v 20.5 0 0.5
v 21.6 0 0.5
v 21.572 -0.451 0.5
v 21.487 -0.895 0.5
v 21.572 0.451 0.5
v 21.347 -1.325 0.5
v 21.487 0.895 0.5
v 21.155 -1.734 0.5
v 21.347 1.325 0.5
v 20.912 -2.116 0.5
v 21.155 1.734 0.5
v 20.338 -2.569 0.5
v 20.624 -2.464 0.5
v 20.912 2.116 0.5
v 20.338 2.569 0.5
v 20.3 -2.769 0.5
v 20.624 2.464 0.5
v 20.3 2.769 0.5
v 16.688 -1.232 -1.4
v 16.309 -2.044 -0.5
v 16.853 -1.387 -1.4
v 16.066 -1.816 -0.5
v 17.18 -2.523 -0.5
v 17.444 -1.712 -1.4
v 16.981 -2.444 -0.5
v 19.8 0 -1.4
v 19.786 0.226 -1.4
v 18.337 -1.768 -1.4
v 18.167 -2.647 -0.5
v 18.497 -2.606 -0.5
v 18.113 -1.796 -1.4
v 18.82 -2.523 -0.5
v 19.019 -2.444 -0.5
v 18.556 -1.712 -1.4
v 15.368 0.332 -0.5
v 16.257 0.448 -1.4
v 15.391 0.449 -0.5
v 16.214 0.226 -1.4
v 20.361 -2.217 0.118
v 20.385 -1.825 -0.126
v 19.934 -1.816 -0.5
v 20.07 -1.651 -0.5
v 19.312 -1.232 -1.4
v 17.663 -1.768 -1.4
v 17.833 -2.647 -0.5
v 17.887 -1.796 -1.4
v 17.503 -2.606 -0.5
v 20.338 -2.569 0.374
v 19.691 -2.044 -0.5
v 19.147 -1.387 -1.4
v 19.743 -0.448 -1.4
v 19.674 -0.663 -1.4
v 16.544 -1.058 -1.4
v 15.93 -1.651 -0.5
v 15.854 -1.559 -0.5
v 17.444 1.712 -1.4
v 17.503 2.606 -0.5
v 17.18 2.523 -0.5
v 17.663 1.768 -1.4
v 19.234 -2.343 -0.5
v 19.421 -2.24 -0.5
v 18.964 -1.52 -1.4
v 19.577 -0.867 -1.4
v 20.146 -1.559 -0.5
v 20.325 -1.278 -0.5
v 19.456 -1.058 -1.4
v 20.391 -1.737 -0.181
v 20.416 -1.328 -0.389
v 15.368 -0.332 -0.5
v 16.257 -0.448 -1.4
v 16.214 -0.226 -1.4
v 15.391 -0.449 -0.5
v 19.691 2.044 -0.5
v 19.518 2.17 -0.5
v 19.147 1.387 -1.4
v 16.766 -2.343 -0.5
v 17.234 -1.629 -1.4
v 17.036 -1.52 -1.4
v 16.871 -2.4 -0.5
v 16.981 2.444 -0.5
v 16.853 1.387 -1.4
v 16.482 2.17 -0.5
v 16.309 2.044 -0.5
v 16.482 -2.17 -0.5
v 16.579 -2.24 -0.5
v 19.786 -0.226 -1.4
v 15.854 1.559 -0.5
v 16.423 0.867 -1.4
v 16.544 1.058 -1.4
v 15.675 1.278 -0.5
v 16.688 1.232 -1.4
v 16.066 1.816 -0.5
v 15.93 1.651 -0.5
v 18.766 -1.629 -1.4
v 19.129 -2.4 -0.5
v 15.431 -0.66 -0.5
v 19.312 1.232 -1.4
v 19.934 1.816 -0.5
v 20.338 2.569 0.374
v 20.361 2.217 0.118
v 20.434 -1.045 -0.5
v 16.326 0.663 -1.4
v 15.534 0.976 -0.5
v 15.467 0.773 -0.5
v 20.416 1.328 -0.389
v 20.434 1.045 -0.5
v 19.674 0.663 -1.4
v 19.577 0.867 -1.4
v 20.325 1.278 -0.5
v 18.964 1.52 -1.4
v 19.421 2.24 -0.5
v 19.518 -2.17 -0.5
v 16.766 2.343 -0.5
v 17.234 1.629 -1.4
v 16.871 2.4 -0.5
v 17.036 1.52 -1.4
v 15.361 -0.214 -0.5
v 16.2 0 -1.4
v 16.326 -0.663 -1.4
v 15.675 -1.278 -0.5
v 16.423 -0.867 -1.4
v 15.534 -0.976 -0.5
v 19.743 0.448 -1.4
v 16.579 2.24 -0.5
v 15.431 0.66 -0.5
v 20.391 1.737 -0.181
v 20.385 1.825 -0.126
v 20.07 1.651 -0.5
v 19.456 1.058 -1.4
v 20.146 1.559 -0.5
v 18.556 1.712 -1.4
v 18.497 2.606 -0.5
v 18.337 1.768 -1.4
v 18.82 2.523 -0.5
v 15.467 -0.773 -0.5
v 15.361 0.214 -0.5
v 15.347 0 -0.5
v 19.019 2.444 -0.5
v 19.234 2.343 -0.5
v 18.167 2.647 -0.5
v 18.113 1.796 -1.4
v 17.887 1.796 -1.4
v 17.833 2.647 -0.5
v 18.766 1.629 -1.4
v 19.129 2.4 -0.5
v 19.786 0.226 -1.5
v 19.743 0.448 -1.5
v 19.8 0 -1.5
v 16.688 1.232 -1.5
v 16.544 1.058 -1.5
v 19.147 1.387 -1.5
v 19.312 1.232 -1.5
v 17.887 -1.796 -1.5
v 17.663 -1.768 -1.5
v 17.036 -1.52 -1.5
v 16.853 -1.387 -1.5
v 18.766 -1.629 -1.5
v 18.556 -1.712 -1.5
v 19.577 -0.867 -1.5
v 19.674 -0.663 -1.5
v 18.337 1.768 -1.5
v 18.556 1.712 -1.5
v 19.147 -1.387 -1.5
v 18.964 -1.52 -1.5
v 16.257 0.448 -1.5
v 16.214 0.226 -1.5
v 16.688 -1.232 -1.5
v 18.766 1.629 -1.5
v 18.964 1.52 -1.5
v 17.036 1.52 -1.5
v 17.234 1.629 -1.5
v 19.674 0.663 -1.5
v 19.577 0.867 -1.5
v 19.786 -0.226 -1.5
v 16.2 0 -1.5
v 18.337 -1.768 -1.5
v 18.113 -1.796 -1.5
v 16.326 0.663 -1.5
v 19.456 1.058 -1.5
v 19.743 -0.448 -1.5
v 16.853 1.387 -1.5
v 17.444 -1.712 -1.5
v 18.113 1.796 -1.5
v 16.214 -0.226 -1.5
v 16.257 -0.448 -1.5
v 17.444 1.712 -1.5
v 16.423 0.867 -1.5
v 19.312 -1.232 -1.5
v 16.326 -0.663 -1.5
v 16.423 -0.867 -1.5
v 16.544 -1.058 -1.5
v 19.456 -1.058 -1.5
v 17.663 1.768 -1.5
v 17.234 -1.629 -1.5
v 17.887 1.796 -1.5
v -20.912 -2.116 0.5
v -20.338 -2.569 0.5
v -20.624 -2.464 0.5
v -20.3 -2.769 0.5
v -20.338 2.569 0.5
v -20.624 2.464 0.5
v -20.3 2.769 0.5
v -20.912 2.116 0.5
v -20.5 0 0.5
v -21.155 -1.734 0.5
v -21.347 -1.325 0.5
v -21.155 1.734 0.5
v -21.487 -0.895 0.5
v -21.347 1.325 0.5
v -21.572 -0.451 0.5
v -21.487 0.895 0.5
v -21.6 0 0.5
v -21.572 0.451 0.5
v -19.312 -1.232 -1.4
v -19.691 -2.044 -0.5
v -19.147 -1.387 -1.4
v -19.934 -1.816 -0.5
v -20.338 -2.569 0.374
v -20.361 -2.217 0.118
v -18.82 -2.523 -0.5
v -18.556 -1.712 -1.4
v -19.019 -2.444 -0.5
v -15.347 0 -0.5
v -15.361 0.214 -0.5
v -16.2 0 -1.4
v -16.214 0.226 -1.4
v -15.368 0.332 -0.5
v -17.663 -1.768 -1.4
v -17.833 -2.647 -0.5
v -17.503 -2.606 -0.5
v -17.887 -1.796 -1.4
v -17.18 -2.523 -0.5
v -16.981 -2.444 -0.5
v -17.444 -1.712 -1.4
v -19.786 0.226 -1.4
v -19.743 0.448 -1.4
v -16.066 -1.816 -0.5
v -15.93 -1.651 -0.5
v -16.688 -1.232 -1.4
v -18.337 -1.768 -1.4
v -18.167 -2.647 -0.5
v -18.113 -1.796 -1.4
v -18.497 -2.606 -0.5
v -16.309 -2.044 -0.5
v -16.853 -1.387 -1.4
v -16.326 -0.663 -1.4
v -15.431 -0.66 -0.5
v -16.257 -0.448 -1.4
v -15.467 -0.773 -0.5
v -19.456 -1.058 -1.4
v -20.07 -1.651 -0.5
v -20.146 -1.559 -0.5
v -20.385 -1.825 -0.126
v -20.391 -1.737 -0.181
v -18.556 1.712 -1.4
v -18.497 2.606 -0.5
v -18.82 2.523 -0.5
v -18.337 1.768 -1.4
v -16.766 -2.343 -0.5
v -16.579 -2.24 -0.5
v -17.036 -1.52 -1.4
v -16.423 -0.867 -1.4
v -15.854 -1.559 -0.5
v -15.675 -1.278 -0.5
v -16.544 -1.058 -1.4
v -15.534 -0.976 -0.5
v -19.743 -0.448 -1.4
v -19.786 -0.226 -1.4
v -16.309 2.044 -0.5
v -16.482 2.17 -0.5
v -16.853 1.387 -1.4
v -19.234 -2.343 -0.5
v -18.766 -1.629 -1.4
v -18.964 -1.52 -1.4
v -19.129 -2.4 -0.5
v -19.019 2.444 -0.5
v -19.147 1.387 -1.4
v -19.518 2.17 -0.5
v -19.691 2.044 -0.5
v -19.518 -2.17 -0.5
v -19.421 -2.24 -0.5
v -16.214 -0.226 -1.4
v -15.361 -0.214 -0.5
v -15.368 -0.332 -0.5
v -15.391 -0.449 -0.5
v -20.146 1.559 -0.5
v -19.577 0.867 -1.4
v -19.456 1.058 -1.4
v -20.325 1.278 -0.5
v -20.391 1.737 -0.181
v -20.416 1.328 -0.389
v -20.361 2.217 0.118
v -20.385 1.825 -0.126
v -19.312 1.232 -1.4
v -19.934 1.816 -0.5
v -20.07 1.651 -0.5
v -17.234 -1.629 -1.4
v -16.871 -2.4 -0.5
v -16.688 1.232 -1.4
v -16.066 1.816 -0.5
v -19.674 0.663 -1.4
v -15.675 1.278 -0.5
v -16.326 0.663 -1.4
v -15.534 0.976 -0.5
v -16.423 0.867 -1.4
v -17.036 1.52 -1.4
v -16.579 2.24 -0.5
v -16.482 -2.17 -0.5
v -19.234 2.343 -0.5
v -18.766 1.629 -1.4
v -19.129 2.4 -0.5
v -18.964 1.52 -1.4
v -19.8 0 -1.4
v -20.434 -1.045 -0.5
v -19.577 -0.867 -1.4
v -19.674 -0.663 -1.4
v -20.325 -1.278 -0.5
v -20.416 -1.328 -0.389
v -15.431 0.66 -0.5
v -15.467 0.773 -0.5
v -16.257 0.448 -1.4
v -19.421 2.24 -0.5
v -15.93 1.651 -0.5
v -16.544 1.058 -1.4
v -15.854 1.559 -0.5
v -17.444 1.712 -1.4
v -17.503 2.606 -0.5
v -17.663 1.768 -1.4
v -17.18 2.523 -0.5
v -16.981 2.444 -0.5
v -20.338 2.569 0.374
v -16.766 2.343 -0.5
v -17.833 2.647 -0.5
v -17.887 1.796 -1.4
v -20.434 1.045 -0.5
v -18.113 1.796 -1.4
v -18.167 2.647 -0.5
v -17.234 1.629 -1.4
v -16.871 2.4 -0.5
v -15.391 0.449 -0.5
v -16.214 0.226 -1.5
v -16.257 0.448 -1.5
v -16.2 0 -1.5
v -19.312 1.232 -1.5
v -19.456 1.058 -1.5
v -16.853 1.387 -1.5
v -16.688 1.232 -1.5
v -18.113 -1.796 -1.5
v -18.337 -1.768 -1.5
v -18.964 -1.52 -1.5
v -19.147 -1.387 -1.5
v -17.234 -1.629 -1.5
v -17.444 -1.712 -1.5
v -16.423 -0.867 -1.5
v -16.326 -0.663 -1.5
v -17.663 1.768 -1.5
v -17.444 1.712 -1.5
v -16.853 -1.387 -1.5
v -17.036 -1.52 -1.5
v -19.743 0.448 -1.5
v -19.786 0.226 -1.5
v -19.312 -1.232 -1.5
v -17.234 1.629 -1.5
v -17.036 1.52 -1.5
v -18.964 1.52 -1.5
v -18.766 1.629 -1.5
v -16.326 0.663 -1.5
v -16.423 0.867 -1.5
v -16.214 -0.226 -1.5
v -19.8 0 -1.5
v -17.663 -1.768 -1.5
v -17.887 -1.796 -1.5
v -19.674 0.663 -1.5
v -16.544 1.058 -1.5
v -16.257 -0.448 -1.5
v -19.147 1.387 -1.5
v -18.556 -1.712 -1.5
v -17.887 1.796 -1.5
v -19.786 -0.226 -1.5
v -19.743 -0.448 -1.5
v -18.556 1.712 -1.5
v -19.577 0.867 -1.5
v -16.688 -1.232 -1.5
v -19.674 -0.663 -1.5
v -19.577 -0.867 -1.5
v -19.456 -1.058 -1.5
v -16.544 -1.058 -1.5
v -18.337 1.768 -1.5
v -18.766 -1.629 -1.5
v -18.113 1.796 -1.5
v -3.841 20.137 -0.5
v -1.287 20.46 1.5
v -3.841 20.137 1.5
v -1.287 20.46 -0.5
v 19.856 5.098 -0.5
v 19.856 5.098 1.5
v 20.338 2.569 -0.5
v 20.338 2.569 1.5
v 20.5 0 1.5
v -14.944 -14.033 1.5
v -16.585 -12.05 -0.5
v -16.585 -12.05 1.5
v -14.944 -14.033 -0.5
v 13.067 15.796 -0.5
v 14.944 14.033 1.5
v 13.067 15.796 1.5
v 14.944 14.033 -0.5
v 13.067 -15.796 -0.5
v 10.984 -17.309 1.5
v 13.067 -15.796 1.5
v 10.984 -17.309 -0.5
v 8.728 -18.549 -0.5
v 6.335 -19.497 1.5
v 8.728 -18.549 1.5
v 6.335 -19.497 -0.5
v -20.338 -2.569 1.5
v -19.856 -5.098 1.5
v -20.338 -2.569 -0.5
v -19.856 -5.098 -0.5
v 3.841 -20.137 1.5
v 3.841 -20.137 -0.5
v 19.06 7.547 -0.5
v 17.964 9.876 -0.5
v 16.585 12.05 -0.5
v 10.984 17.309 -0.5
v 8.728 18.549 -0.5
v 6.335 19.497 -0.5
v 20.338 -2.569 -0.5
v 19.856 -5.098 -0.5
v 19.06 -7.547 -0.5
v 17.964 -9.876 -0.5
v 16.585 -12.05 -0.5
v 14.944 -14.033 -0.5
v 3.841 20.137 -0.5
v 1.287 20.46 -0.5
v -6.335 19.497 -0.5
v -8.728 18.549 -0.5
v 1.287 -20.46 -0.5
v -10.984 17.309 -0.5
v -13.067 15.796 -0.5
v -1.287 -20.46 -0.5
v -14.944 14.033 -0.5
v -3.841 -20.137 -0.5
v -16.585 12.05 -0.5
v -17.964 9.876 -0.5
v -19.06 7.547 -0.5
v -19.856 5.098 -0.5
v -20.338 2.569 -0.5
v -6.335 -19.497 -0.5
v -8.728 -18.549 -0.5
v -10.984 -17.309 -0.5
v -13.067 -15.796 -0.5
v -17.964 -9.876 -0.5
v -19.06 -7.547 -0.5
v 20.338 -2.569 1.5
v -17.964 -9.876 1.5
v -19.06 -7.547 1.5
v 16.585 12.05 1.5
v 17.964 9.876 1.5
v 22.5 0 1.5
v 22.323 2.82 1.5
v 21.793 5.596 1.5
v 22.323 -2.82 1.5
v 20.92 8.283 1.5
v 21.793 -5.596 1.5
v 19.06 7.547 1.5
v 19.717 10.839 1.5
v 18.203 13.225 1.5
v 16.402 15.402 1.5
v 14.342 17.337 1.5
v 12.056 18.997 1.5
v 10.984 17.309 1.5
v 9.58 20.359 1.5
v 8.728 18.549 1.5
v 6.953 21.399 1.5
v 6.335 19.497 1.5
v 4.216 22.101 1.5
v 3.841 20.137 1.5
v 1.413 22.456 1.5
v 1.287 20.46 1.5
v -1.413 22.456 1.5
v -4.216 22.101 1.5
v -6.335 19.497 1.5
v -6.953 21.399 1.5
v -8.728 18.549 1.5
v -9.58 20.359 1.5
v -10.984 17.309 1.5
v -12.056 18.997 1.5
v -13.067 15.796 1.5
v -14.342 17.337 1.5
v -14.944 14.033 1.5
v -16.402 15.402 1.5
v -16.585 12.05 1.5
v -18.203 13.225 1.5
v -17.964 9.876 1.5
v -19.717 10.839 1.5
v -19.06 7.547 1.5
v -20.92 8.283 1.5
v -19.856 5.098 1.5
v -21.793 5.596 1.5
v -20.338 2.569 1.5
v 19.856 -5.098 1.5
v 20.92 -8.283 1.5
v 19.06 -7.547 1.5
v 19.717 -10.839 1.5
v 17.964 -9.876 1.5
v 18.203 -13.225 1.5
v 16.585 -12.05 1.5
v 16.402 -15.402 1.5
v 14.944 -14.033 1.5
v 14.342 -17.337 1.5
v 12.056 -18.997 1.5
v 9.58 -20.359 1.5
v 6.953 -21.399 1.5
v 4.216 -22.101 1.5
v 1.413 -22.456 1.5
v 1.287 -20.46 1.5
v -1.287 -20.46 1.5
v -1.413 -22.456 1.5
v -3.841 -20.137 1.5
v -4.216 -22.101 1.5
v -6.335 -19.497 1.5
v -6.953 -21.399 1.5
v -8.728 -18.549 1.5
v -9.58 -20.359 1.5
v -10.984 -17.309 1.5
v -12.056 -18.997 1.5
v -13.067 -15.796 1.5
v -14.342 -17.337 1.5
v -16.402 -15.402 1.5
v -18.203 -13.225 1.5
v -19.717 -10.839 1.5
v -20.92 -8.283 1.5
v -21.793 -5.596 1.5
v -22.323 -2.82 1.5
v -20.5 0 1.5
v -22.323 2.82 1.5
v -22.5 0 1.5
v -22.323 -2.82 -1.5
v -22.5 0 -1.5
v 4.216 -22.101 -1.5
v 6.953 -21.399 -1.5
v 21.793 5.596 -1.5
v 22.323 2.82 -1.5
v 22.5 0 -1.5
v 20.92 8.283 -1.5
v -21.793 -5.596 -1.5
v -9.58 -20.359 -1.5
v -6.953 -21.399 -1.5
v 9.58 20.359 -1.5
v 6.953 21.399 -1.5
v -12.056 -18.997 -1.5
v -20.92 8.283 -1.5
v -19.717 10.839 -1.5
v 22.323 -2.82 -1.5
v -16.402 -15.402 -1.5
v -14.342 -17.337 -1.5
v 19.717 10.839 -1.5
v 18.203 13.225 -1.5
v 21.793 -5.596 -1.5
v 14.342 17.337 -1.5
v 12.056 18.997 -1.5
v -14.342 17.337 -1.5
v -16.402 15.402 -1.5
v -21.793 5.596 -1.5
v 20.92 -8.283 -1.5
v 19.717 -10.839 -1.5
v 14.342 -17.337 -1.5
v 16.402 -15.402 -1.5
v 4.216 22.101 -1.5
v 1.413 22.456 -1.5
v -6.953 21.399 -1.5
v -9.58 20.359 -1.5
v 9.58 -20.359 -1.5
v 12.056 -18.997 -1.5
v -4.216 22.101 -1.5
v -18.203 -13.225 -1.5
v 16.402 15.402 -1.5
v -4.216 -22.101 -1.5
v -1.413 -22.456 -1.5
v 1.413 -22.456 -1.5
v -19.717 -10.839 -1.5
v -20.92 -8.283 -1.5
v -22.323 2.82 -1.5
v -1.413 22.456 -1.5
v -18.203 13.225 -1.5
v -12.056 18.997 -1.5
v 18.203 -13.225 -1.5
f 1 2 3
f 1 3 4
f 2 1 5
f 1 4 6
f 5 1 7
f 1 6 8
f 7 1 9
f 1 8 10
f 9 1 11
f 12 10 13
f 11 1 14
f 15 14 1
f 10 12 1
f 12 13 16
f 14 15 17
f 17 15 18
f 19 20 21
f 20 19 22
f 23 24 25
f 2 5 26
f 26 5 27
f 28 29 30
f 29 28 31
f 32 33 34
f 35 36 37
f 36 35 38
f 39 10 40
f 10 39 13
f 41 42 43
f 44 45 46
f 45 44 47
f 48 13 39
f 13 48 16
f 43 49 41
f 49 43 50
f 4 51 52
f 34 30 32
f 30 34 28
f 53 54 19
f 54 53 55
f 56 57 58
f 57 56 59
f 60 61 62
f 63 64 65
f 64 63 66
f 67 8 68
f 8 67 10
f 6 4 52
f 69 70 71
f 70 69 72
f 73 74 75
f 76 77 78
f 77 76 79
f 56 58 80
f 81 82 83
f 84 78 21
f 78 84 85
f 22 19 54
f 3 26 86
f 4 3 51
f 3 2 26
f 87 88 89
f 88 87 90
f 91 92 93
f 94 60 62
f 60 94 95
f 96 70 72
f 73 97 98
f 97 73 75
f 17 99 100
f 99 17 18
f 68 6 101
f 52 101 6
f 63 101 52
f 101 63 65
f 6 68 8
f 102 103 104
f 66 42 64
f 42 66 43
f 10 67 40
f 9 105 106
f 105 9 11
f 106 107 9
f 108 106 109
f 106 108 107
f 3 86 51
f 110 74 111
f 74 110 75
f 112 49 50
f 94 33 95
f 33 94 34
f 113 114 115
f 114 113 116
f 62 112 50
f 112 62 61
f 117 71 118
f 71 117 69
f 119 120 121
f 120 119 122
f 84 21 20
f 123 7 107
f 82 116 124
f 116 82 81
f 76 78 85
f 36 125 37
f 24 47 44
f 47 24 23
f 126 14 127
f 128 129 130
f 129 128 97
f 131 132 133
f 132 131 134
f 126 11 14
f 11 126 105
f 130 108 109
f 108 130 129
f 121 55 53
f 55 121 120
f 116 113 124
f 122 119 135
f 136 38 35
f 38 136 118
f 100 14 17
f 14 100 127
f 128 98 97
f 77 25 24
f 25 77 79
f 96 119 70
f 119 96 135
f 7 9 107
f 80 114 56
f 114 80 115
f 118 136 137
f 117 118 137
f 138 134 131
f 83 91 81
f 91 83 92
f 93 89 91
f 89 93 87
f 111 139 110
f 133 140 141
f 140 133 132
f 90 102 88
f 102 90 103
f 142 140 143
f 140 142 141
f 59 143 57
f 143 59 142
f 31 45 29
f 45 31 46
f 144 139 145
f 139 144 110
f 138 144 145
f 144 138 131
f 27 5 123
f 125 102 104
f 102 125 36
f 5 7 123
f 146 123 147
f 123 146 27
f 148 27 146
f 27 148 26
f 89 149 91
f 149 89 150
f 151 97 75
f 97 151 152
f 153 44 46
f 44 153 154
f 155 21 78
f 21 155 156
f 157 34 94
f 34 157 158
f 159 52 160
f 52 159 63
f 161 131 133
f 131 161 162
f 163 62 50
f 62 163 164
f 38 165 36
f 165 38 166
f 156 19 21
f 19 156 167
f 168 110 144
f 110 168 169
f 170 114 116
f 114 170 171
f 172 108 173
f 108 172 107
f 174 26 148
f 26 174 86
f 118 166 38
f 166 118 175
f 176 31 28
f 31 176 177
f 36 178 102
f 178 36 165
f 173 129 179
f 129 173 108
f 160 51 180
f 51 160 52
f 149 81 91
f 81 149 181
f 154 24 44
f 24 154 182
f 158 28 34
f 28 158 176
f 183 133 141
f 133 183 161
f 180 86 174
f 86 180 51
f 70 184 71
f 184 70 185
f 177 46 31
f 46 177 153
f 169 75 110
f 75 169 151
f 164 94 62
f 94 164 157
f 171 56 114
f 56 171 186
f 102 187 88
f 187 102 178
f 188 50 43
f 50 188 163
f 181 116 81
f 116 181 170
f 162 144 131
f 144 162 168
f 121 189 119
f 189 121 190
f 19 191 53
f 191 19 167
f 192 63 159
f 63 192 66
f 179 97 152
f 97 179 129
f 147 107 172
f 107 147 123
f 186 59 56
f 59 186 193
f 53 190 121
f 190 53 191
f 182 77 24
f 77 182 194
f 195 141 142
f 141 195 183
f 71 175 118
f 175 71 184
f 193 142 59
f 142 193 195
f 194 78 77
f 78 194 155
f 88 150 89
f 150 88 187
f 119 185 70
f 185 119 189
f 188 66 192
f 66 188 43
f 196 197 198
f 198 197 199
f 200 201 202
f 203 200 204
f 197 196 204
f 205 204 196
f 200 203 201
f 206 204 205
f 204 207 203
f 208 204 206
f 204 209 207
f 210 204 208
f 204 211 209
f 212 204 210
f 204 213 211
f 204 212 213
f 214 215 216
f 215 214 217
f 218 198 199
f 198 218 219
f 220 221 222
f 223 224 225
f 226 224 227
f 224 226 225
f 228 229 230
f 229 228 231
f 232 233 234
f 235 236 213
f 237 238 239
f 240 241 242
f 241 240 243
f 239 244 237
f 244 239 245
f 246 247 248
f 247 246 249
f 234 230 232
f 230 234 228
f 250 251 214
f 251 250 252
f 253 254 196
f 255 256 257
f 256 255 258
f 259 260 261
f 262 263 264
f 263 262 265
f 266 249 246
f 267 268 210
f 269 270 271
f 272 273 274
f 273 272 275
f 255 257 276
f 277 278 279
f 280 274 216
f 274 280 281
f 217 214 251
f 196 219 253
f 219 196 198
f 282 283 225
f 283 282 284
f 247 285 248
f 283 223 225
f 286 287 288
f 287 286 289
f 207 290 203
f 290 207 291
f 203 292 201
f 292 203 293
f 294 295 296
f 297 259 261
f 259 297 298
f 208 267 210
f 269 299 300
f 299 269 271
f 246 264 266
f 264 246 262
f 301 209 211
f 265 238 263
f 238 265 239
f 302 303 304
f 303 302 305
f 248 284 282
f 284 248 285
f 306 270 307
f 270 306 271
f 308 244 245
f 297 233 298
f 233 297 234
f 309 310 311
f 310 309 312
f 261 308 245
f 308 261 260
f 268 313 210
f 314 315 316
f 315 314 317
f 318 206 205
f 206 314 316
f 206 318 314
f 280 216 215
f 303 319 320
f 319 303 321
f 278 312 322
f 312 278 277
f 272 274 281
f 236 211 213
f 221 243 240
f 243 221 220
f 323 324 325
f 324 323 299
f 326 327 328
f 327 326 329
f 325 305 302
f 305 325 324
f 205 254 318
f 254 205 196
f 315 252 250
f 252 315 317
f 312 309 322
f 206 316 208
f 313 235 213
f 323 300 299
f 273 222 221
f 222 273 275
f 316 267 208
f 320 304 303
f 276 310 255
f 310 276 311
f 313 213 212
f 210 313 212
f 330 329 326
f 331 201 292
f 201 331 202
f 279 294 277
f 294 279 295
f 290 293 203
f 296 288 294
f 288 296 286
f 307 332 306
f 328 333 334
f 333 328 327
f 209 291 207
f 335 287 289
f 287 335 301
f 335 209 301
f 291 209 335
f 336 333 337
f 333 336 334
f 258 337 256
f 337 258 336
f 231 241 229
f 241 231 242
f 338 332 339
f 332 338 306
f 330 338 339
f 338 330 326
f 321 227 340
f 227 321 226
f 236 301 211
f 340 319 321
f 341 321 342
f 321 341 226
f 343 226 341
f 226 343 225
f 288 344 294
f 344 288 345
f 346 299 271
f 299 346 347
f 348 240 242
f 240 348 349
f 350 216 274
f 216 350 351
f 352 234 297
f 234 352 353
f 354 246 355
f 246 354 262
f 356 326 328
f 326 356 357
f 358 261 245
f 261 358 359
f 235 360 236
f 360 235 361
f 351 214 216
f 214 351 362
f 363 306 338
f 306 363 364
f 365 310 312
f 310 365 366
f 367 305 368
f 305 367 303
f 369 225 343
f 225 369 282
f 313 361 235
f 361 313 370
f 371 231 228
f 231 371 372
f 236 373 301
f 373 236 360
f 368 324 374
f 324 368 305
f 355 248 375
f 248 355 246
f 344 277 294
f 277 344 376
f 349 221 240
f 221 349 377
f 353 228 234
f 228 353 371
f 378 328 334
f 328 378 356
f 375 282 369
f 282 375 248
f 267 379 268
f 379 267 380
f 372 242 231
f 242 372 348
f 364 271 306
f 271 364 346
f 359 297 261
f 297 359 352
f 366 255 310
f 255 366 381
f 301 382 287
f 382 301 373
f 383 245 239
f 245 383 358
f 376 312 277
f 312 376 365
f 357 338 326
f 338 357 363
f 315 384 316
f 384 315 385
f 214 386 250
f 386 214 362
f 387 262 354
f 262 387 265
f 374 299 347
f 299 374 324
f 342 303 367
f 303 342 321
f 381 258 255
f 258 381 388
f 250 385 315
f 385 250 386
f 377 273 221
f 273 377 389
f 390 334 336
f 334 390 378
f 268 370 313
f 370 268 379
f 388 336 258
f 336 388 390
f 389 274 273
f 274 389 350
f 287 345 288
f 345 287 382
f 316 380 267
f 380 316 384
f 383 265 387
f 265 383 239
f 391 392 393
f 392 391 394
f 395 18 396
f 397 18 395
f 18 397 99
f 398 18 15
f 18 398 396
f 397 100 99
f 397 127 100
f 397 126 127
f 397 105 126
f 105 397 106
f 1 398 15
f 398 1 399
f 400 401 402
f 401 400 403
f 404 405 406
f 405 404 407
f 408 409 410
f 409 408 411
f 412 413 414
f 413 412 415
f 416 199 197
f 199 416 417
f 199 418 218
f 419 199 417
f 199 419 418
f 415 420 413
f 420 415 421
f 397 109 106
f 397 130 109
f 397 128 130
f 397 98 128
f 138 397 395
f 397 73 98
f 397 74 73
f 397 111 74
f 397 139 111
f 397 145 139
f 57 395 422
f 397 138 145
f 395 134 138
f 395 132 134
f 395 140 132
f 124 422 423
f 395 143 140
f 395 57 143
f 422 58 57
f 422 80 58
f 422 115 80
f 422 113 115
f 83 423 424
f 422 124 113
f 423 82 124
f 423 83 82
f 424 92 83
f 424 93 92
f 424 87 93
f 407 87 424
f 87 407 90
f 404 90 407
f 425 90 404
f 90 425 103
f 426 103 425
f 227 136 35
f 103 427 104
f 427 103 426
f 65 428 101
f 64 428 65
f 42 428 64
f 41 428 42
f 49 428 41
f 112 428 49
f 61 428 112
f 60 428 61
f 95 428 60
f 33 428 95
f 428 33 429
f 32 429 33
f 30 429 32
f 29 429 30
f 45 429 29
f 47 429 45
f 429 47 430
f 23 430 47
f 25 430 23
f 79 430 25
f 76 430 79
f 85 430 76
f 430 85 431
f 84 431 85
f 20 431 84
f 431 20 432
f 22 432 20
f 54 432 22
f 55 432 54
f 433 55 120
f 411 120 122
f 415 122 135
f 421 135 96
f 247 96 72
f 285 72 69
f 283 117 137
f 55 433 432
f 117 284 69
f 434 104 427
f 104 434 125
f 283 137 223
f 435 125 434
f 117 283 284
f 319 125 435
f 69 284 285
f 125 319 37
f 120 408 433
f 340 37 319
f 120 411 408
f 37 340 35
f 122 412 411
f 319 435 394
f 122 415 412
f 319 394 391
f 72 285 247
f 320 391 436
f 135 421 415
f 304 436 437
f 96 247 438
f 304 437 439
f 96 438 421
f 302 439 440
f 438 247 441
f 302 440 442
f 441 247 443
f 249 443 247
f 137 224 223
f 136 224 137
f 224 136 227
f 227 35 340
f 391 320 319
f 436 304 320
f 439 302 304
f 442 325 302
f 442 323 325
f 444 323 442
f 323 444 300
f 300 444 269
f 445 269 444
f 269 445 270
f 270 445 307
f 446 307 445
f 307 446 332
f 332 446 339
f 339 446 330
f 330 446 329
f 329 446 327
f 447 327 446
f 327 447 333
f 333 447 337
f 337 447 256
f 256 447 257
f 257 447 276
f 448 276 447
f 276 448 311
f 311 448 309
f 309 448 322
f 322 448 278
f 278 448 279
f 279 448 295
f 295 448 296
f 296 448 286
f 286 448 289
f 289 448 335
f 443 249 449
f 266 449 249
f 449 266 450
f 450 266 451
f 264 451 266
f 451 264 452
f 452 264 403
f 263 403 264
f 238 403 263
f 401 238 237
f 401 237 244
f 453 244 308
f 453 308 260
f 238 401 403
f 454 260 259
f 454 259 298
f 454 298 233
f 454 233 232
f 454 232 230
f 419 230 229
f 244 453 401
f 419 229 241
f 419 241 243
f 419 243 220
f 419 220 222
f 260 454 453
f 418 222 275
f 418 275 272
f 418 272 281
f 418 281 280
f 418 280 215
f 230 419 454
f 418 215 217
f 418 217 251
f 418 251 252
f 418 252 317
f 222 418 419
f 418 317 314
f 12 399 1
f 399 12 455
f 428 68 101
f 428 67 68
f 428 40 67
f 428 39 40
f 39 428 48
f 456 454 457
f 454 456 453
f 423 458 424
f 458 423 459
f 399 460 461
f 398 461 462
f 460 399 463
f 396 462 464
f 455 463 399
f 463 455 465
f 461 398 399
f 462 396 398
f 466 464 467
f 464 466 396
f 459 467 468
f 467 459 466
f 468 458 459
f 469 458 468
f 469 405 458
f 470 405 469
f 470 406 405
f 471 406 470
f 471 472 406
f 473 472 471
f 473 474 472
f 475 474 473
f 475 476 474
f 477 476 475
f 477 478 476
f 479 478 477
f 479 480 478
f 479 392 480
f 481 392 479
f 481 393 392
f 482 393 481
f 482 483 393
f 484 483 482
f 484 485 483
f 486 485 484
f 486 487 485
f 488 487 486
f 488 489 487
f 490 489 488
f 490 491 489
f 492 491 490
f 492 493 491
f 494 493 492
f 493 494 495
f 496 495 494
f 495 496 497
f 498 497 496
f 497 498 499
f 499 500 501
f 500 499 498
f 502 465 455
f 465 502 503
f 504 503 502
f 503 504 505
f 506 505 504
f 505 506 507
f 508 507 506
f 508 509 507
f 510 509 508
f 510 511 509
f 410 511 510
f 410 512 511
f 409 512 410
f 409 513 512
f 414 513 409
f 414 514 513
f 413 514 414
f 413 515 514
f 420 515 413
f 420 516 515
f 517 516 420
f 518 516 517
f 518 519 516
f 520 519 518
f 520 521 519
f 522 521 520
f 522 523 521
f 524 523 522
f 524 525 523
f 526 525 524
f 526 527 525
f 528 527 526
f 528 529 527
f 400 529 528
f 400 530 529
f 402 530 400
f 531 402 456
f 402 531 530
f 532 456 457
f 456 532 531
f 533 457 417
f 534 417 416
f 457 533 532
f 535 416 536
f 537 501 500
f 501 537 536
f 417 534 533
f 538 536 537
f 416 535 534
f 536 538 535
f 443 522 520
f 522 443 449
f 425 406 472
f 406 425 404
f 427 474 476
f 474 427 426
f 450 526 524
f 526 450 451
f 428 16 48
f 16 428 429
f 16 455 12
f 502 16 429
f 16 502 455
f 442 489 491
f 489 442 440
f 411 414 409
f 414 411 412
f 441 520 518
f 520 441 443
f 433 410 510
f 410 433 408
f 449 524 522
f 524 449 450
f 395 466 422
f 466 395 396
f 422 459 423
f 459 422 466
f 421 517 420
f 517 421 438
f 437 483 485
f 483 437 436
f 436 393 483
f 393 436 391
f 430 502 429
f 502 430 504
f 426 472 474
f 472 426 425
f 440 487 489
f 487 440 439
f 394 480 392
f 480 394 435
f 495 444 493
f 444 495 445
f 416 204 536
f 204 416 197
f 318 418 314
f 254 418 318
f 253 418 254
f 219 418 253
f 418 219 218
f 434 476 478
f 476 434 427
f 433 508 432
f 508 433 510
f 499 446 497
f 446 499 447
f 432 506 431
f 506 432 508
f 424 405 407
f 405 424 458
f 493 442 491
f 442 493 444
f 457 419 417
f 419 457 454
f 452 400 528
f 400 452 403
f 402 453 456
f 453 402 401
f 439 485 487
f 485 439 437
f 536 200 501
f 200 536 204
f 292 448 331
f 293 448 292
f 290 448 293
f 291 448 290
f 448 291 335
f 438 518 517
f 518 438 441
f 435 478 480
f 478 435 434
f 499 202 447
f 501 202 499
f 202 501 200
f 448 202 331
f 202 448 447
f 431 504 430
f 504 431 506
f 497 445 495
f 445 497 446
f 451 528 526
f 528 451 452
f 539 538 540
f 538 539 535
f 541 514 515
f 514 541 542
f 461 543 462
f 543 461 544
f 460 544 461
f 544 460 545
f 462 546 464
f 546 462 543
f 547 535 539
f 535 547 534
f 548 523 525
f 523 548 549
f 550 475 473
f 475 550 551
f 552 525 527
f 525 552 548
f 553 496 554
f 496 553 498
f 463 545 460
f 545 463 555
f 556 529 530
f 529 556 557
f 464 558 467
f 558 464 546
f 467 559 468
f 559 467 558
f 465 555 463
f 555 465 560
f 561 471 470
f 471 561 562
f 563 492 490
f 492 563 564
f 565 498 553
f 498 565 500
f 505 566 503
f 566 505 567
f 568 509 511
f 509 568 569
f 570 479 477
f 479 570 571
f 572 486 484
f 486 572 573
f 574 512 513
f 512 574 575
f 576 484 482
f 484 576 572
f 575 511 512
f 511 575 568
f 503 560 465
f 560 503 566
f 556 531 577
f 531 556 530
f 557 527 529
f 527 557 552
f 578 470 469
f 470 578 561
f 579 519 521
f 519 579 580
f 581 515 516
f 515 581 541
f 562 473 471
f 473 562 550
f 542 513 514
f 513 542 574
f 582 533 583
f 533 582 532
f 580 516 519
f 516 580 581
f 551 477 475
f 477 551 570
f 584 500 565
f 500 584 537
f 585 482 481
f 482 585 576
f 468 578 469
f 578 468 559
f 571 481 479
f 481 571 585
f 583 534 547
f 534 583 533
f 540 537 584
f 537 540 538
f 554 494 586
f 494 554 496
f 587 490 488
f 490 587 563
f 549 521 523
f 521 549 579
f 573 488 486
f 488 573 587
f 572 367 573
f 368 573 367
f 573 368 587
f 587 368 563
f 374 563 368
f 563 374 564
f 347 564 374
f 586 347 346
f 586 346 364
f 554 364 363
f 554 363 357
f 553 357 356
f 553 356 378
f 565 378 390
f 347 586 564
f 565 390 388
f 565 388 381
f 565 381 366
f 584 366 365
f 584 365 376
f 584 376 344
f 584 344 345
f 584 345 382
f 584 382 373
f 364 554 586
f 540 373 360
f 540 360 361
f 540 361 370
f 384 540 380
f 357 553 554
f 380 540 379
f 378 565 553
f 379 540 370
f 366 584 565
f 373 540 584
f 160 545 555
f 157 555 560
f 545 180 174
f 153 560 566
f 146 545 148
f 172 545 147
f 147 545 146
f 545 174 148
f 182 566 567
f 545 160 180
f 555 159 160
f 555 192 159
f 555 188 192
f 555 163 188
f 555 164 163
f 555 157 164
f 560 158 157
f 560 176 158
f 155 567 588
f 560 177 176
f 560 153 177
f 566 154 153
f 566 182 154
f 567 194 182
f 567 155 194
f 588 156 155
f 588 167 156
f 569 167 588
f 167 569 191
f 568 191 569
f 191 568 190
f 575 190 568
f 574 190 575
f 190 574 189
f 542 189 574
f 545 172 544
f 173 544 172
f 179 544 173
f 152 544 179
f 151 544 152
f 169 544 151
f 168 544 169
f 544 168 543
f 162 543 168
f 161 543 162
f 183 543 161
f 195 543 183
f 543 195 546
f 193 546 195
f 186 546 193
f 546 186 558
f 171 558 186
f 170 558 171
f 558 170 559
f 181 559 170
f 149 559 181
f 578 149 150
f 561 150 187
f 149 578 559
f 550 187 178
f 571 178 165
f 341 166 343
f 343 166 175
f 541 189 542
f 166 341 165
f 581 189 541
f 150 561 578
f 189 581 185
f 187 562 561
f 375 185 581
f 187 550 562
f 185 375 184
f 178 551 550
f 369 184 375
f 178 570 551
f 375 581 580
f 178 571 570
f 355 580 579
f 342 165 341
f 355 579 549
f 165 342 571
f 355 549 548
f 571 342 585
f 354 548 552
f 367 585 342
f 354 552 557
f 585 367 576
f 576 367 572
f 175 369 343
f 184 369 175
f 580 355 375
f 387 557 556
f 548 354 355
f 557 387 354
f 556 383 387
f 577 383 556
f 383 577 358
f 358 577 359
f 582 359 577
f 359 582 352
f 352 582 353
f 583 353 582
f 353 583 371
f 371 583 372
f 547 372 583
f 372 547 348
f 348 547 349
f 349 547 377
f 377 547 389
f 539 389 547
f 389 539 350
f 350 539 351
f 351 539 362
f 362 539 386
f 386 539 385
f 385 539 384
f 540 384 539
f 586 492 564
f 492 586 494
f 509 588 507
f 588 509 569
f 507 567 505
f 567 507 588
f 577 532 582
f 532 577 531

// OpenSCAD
$fn = 50;


difference() {
	union() {
		translate(v = [0, 0, -1.5000000000]) {
			cylinder(h = 3, r = 22.5000000000);
		}
	}
	union() {
		translate(v = [18.0000000000, 0, 0.5000000000]) {
			rotate(a = [0, 0, 0]) {
				difference() {
					union() {
						translate(v = [0, 0, -10.0000000000]) {
							rotate(a = [0, 0, 0]) {
								difference() {
									union() {
										#translate(v = [-1.7500000000, -3.2500000000, -0.3000000000]) {
											cube(size = [3.5000000000, 6.5000000000, 0.3000000000]);
										}
										#translate(v = [-1.7500000000, -1.7500000000, -0.6000000000]) {
											cube(size = [3.5000000000, 3.5000000000, 0.3000000000]);
										}
										#translate(v = [-1.7500000000, -3.2500000000, 2.5000000000]) {
											cube(size = [3.5000000000, 6.5000000000, 0.3000000000]);
										}
										#translate(v = [-1.7500000000, -1.7500000000, 2.8000000000]) {
											cube(size = [3.5000000000, 3.5000000000, 0.3000000000]);
										}
										#linear_extrude(height = 2.5000000000) {
											polygon(points = [[3.4620000000, 0.0000000000], [1.7310000000, 2.9981799479], [-1.7310000000, 2.9981799479], [-3.4620000000, 0.0000000000], [-1.7310000000, -2.9981799479], [1.7310000000, -2.9981799479]]);
										}
										#translate(v = [-1.7500000000, -3.2500000000, -0.3000000000]) {
											cube(size = [3.5000000000, 6.5000000000, 0.3000000000]);
										}
										#translate(v = [-1.7500000000, -1.7500000000, -0.6000000000]) {
											cube(size = [3.5000000000, 3.5000000000, 0.3000000000]);
										}
										#translate(v = [-1.7500000000, -3.2500000000, 2.5000000000]) {
											cube(size = [3.5000000000, 6.5000000000, 0.3000000000]);
										}
										#translate(v = [-1.7500000000, -1.7500000000, 2.8000000000]) {
											cube(size = [3.5000000000, 3.5000000000, 0.3000000000]);
										}
										#translate(v = [-1.7500000000, -3.2500000000, -0.3000000000]) {
											cube(size = [3.5000000000, 6.5000000000, 0.3000000000]);
										}
										#translate(v = [-1.7500000000, -1.7500000000, -0.6000000000]) {
											cube(size = [3.5000000000, 3.5000000000, 0.3000000000]);
										}
										#translate(v = [-1.7500000000, -3.2500000000, 2.5000000000]) {
											cube(size = [3.5000000000, 6.5000000000, 0.3000000000]);
										}
										#translate(v = [-1.7500000000, -1.7500000000, 2.8000000000]) {
											cube(size = [3.5000000000, 3.5000000000, 0.3000000000]);
										}
									}
									union();
								}
							}
						}
						translate(v = [0, 0, -10.0000000000]) {
							rotate(a = [0, 0, 0]) {
								difference() {
									union() {
										#translate(v = [-1.7500000000, -3.2500000000, -0.3000000000]) {
											cube(size = [3.5000000000, 6.5000000000, 0.3000000000]);
										}
										#translate(v = [-1.7500000000, -1.7500000000, -0.6000000000]) {
											cube(size = [3.5000000000, 3.5000000000, 0.3000000000]);
										}
										#translate(v = [-1.7500000000, -3.2500000000, 2.5000000000]) {
											cube(size = [3.5000000000, 6.5000000000, 0.3000000000]);
										}
										#translate(v = [-1.7500000000, -1.7500000000, 2.8000000000]) {
											cube(size = [3.5000000000, 3.5000000000, 0.3000000000]);
										}
										#linear_extrude(height = 2.5000000000) {
											polygon(points = [[3.4620000000, 0.0000000000], [1.7310000000, 2.9981799479], [-1.7310000000, 2.9981799479], [-3.4620000000, 0.0000000000], [-1.7310000000, -2.9981799479], [1.7310000000, -2.9981799479]]);
										}
										#translate(v = [-1.7500000000, -3.2500000000, -0.3000000000]) {
											cube(size = [3.5000000000, 6.5000000000, 0.3000000000]);
										}
										#translate(v = [-1.7500000000, -1.7500000000, -0.6000000000]) {
											cube(size = [3.5000000000, 3.5000000000, 0.3000000000]);
										}
										#translate(v = [-1.7500000000, -3.2500000000, 2.5000000000]) {
											cube(size = [3.5000000000, 6.5000000000, 0.3000000000]);
										}
										#translate(v = [-1.7500000000, -1.7500000000, 2.8000000000]) {
											cube(size = [3.5000000000, 3.5000000000, 0.3000000000]);
										}
										#translate(v = [-1.7500000000, -3.2500000000, -0.3000000000]) {
											cube(size = [3.5000000000, 6.5000000000, 0.3000000000]);
										}
										#translate(v = [-1.7500000000, -1.7500000000, -0.6000000000]) {
											cube(size = [3.5000000000, 3.5000000000, 0.3000000000]);
										}
										#translate(v = [-1.7500000000, -3.2500000000, 2.5000000000]) {
											cube(size = [3.5000000000, 6.5000000000, 0.3000000000]);
										}
										#translate(v = [-1.7500000000, -1.7500000000, 2.8000000000]) {
											cube(size = [3.5000000000, 3.5000000000, 0.3000000000]);
										}
									}
									union();
								}
							}
						}
						translate(v = [0, 0, -10.0000000000]) {
							rotate(a = [0, 0, 0]) {
								difference() {
									union() {
										#translate(v = [-1.7500000000, -3.2500000000, -0.3000000000]) {
											cube(size = [3.5000000000, 6.5000000000, 0.3000000000]);
										}
										#translate(v = [-1.7500000000, -1.7500000000, -0.6000000000]) {
											cube(size = [3.5000000000, 3.5000000000, 0.3000000000]);
										}
										#translate(v = [-1.7500000000, -3.2500000000, 2.5000000000]) {
											cube(size = [3.5000000000, 6.5000000000, 0.3000000000]);
										}
										#translate(v = [-1.7500000000, -1.7500000000, 2.8000000000]) {
											cube(size = [3.5000000000, 3.5000000000, 0.3000000000]);
										}
										#linear_extrude(height = 2.5000000000) {
											polygon(points = [[3.4620000000, 0.0000000000], [1.7310000000, 2.9981799479], [-1.7310000000, 2.9981799479], [-3.4620000000, 0.0000000000], [-1.7310000000, -2.9981799479], [1.7310000000, -2.9981799479]]);
										}
										#translate(v = [-1.7500000000, -3.2500000000, -0.3000000000]) {
											cube(size = [3.5000000000, 6.5000000000, 0.3000000000]);
										}
										#translate(v = [-1.7500000000, -1.7500000000, -0.6000000000]) {
											cube(size = [3.5000000000, 3.5000000000, 0.3000000000]);
										}
										#translate(v = [-1.7500000000, -3.2500000000, 2.5000000000]) {
											cube(size = [3.5000000000, 6.5000000000, 0.3000000000]);
										}
										#translate(v = [-1.7500000000, -1.7500000000, 2.8000000000]) {
											cube(size = [3.5000000000, 3.5000000000, 0.3000000000]);
										}
										#translate(v = [-1.7500000000, -3.2500000000, -0.3000000000]) {
											cube(size = [3.5000000000, 6.5000000000, 0.3000000000]);
										}
										#translate(v = [-1.7500000000, -1.7500000000, -0.6000000000]) {
											cube(size = [3.5000000000, 3.5000000000, 0.3000000000]);
										}
										#translate(v = [-1.7500000000, -3.2500000000, 2.5000000000]) {
											cube(size = [3.5000000000, 6.5000000000, 0.3000000000]);
										}
										#translate(v = [-1.7500000000, -1.7500000000, 2.8000000000]) {
											cube(size = [3.5000000000, 3.5000000000, 0.3000000000]);
										}
									}
									union();
								}
							}
						}
						#translate(v = [0, 0, -10.0000000000]) {
							cylinder(h = 10, r = 1.5000000000);
						}
						#translate(v = [0, 0, -1.9000000000]) {
							cylinder(h = 1.9000000000, r1 = 1.8000000000, r2 = 3.6000000000);
						}
						#translate(v = [0, 0, -10.0000000000]) {
							cylinder(h = 10, r = 1.8000000000);
						}
						#translate(v = [0, 0, -10.0000000000]) {
							cylinder(h = 10, r = 1.5000000000);
						}
					}
					union();
				}
			}
		}
		translate(v = [-18.0000000000, 0, 0.5000000000]) {
			rotate(a = [0, 0, 0]) {
				difference() {
					union() {
						translate(v = [0, 0, -10.0000000000]) {
							rotate(a = [0, 0, 0]) {
								difference() {
									union() {
										#translate(v = [-1.7500000000, -3.2500000000, -0.3000000000]) {
											cube(size = [3.5000000000, 6.5000000000, 0.3000000000]);
										}
										#translate(v = [-1.7500000000, -1.7500000000, -0.6000000000]) {
											cube(size = [3.5000000000, 3.5000000000, 0.3000000000]);
										}
										#translate(v = [-1.7500000000, -3.2500000000, 2.5000000000]) {
											cube(size = [3.5000000000, 6.5000000000, 0.3000000000]);
										}
										#translate(v = [-1.7500000000, -1.7500000000, 2.8000000000]) {
											cube(size = [3.5000000000, 3.5000000000, 0.3000000000]);
										}
										#linear_extrude(height = 2.5000000000) {
											polygon(points = [[3.4620000000, 0.0000000000], [1.7310000000, 2.9981799479], [-1.7310000000, 2.9981799479], [-3.4620000000, 0.0000000000], [-1.7310000000, -2.9981799479], [1.7310000000, -2.9981799479]]);
										}
										#translate(v = [-1.7500000000, -3.2500000000, -0.3000000000]) {
											cube(size = [3.5000000000, 6.5000000000, 0.3000000000]);
										}
										#translate(v = [-1.7500000000, -1.7500000000, -0.6000000000]) {
											cube(size = [3.5000000000, 3.5000000000, 0.3000000000]);
										}
										#translate(v = [-1.7500000000, -3.2500000000, 2.5000000000]) {
											cube(size = [3.5000000000, 6.5000000000, 0.3000000000]);
										}
										#translate(v = [-1.7500000000, -1.7500000000, 2.8000000000]) {
											cube(size = [3.5000000000, 3.5000000000, 0.3000000000]);
										}
										#translate(v = [-1.7500000000, -3.2500000000, -0.3000000000]) {
											cube(size = [3.5000000000, 6.5000000000, 0.3000000000]);
										}
										#translate(v = [-1.7500000000, -1.7500000000, -0.6000000000]) {
											cube(size = [3.5000000000, 3.5000000000, 0.3000000000]);
										}
										#translate(v = [-1.7500000000, -3.2500000000, 2.5000000000]) {
											cube(size = [3.5000000000, 6.5000000000, 0.3000000000]);
										}
										#translate(v = [-1.7500000000, -1.7500000000, 2.8000000000]) {
											cube(size = [3.5000000000, 3.5000000000, 0.3000000000]);
										}
									}
									union();
								}
							}
						}
						translate(v = [0, 0, -10.0000000000]) {
							rotate(a = [0, 0, 0]) {
								difference() {
									union() {
										#translate(v = [-1.7500000000, -3.2500000000, -0.3000000000]) {
											cube(size = [3.5000000000, 6.5000000000, 0.3000000000]);
										}
										#translate(v = [-1.7500000000, -1.7500000000, -0.6000000000]) {
											cube(size = [3.5000000000, 3.5000000000, 0.3000000000]);
										}
										#translate(v = [-1.7500000000, -3.2500000000, 2.5000000000]) {
											cube(size = [3.5000000000, 6.5000000000, 0.3000000000]);
										}
										#translate(v = [-1.7500000000, -1.7500000000, 2.8000000000]) {
											cube(size = [3.5000000000, 3.5000000000, 0.3000000000]);
										}
										#linear_extrude(height = 2.5000000000) {
											polygon(points = [[3.4620000000, 0.0000000000], [1.7310000000, 2.9981799479], [-1.7310000000, 2.9981799479], [-3.4620000000, 0.0000000000], [-1.7310000000, -2.9981799479], [1.7310000000, -2.9981799479]]);
										}
										#translate(v = [-1.7500000000, -3.2500000000, -0.3000000000]) {
											cube(size = [3.5000000000, 6.5000000000, 0.3000000000]);
										}
										#translate(v = [-1.7500000000, -1.7500000000, -0.6000000000]) {
											cube(size = [3.5000000000, 3.5000000000, 0.3000000000]);
										}
										#translate(v = [-1.7500000000, -3.2500000000, 2.5000000000]) {
											cube(size = [3.5000000000, 6.5000000000, 0.3000000000]);
										}
										#translate(v = [-1.7500000000, -1.7500000000, 2.8000000000]) {
											cube(size = [3.5000000000, 3.5000000000, 0.3000000000]);
										}
										#translate(v = [-1.7500000000, -3.2500000000, -0.3000000000]) {
											cube(size = [3.5000000000, 6.5000000000, 0.3000000000]);
										}
										#translate(v = [-1.7500000000, -1.7500000000, -0.6000000000]) {
											cube(size = [3.5000000000, 3.5000000000, 0.3000000000]);
										}
										#translate(v = [-1.7500000000, -3.2500000000, 2.5000000000]) {
											cube(size = [3.5000000000, 6.5000000000, 0.3000000000]);
										}
										#translate(v = [-1.7500000000, -1.7500000000, 2.8000000000]) {
											cube(size = [3.5000000000, 3.5000000000, 0.3000000000]);
										}
									}
									union();
								}
							}
						}
						translate(v = [0, 0, -10.0000000000]) {
							rotate(a = [0, 0, 0]) {
								difference() {
									union() {
										#translate(v = [-1.7500000000, -3.2500000000, -0.3000000000]) {
											cube(size = [3.5000000000, 6.5000000000, 0.3000000000]);
										}
										#translate(v = [-1.7500000000, -1.7500000000, -0.6000000000]) {
											cube(size = [3.5000000000, 3.5000000000, 0.3000000000]);
										}
										#translate(v = [-1.7500000000, -3.2500000000, 2.5000000000]) {
											cube(size = [3.5000000000, 6.5000000000, 0.3000000000]);
										}
										#translate(v = [-1.7500000000, -1.7500000000, 2.8000000000]) {
											cube(size = [3.5000000000, 3.5000000000, 0.3000000000]);
										}
										#linear_extrude(height = 2.5000000000) {
											polygon(points = [[3.4620000000, 0.0000000000], [1.7310000000, 2.9981799479], [-1.7310000000, 2.9981799479], [-3.4620000000, 0.0000000000], [-1.7310000000, -2.9981799479], [1.7310000000, -2.9981799479]]);
										}
										#translate(v = [-1.7500000000, -3.2500000000, -0.3000000000]) {
											cube(size = [3.5000000000, 6.5000000000, 0.3000000000]);
										}
										#translate(v = [-1.7500000000, -1.7500000000, -0.6000000000]) {
											cube(size = [3.5000000000, 3.5000000000, 0.3000000000]);
										}
										#translate(v = [-1.7500000000, -3.2500000000, 2.5000000000]) {
											cube(size = [3.5000000000, 6.5000000000, 0.3000000000]);
										}
										#translate(v = [-1.7500000000, -1.7500000000, 2.8000000000]) {
											cube(size = [3.5000000000, 3.5000000000, 0.3000000000]);
										}
										#translate(v = [-1.7500000000, -3.2500000000, -0.3000000000]) {
											cube(size = [3.5000000000, 6.5000000000, 0.3000000000]);
										}
										#translate(v = [-1.7500000000, -1.7500000000, -0.6000000000]) {
											cube(size = [3.5000000000, 3.5000000000, 0.3000000000]);
										}
										#translate(v = [-1.7500000000, -3.2500000000, 2.5000000000]) {
											cube(size = [3.5000000000, 6.5000000000, 0.3000000000]);
										}
										#translate(v = [-1.7500000000, -1.7500000000, 2.8000000000]) {
											cube(size = [3.5000000000, 3.5000000000, 0.3000000000]);
										}
									}
									union();
								}
							}
						}
						#translate(v = [0, 0, -10.0000000000]) {
							cylinder(h = 10, r = 1.5000000000);
						}
						#translate(v = [0, 0, -1.9000000000]) {
							cylinder(h = 1.9000000000, r1 = 1.8000000000, r2 = 3.6000000000);
						}
						#translate(v = [0, 0, -10.0000000000]) {
							cylinder(h = 10, r = 1.8000000000);
						}
						#translate(v = [0, 0, -10.0000000000]) {
							cylinder(h = 10, r = 1.5000000000);
						}
					}
					union();
				}
			}
		}
		translate(v = [0, 0, -0.5000000000]) {
			cylinder(h = 2, r = 20.5000000000);
		}
	}
}
